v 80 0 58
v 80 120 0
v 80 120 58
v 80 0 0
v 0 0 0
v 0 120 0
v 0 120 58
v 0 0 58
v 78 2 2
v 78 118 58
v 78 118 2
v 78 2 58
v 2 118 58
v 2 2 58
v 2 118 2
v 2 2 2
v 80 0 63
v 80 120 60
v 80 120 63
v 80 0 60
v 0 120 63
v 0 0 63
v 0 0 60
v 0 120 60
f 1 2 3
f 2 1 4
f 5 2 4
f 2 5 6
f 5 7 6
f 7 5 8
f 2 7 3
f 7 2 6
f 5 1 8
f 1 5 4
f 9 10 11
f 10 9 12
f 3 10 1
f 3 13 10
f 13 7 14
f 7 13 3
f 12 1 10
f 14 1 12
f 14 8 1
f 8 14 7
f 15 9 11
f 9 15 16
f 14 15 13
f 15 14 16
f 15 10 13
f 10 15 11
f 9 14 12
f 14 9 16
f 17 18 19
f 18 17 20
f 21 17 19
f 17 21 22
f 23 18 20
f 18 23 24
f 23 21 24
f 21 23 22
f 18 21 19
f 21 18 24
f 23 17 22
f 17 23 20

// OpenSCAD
// 03stackablebins.scad
// Advanced: Stackable storage bins
// Parameters
binw = 80;      // width
bind = 120;     // depth
binh = 60;      // height
wall = 2;        // wall thickness
rim = 3;         // interlock rim height
chamfer = 2;
stackclear = 0.6; // clearance between stacks

module outer(){
  cube([binw, bind, binh]);
}

module inner(){
  translate([wall, wall, wall])
    cube([binw-2*wall, bind-2*wall, binh-2*wall]);
}

module body(){
  difference(){ outer(); inner(); }
}

module rimouter(){
  translate([0,0,binh]) cube([binw, bind, rim]);
}

module riminner(){
  translate([wall+stackclear, wall+stackclear, binh])
    cube([binw-2*(wall+stackclear), bind-2*(wall+stackclear), rim]);
}

module chamferedges(){
  // Simple top edge chamfer via difference
  difference(){
    children();
    translate([-1,-1,binh-chamfer]) cube([binw+2, bind+2, chamfer+2]);
  }
}

union(){
  chamferedges(){ body(); }
  rimouter();
  difference(){ rimouter(); riminner(); }
}
